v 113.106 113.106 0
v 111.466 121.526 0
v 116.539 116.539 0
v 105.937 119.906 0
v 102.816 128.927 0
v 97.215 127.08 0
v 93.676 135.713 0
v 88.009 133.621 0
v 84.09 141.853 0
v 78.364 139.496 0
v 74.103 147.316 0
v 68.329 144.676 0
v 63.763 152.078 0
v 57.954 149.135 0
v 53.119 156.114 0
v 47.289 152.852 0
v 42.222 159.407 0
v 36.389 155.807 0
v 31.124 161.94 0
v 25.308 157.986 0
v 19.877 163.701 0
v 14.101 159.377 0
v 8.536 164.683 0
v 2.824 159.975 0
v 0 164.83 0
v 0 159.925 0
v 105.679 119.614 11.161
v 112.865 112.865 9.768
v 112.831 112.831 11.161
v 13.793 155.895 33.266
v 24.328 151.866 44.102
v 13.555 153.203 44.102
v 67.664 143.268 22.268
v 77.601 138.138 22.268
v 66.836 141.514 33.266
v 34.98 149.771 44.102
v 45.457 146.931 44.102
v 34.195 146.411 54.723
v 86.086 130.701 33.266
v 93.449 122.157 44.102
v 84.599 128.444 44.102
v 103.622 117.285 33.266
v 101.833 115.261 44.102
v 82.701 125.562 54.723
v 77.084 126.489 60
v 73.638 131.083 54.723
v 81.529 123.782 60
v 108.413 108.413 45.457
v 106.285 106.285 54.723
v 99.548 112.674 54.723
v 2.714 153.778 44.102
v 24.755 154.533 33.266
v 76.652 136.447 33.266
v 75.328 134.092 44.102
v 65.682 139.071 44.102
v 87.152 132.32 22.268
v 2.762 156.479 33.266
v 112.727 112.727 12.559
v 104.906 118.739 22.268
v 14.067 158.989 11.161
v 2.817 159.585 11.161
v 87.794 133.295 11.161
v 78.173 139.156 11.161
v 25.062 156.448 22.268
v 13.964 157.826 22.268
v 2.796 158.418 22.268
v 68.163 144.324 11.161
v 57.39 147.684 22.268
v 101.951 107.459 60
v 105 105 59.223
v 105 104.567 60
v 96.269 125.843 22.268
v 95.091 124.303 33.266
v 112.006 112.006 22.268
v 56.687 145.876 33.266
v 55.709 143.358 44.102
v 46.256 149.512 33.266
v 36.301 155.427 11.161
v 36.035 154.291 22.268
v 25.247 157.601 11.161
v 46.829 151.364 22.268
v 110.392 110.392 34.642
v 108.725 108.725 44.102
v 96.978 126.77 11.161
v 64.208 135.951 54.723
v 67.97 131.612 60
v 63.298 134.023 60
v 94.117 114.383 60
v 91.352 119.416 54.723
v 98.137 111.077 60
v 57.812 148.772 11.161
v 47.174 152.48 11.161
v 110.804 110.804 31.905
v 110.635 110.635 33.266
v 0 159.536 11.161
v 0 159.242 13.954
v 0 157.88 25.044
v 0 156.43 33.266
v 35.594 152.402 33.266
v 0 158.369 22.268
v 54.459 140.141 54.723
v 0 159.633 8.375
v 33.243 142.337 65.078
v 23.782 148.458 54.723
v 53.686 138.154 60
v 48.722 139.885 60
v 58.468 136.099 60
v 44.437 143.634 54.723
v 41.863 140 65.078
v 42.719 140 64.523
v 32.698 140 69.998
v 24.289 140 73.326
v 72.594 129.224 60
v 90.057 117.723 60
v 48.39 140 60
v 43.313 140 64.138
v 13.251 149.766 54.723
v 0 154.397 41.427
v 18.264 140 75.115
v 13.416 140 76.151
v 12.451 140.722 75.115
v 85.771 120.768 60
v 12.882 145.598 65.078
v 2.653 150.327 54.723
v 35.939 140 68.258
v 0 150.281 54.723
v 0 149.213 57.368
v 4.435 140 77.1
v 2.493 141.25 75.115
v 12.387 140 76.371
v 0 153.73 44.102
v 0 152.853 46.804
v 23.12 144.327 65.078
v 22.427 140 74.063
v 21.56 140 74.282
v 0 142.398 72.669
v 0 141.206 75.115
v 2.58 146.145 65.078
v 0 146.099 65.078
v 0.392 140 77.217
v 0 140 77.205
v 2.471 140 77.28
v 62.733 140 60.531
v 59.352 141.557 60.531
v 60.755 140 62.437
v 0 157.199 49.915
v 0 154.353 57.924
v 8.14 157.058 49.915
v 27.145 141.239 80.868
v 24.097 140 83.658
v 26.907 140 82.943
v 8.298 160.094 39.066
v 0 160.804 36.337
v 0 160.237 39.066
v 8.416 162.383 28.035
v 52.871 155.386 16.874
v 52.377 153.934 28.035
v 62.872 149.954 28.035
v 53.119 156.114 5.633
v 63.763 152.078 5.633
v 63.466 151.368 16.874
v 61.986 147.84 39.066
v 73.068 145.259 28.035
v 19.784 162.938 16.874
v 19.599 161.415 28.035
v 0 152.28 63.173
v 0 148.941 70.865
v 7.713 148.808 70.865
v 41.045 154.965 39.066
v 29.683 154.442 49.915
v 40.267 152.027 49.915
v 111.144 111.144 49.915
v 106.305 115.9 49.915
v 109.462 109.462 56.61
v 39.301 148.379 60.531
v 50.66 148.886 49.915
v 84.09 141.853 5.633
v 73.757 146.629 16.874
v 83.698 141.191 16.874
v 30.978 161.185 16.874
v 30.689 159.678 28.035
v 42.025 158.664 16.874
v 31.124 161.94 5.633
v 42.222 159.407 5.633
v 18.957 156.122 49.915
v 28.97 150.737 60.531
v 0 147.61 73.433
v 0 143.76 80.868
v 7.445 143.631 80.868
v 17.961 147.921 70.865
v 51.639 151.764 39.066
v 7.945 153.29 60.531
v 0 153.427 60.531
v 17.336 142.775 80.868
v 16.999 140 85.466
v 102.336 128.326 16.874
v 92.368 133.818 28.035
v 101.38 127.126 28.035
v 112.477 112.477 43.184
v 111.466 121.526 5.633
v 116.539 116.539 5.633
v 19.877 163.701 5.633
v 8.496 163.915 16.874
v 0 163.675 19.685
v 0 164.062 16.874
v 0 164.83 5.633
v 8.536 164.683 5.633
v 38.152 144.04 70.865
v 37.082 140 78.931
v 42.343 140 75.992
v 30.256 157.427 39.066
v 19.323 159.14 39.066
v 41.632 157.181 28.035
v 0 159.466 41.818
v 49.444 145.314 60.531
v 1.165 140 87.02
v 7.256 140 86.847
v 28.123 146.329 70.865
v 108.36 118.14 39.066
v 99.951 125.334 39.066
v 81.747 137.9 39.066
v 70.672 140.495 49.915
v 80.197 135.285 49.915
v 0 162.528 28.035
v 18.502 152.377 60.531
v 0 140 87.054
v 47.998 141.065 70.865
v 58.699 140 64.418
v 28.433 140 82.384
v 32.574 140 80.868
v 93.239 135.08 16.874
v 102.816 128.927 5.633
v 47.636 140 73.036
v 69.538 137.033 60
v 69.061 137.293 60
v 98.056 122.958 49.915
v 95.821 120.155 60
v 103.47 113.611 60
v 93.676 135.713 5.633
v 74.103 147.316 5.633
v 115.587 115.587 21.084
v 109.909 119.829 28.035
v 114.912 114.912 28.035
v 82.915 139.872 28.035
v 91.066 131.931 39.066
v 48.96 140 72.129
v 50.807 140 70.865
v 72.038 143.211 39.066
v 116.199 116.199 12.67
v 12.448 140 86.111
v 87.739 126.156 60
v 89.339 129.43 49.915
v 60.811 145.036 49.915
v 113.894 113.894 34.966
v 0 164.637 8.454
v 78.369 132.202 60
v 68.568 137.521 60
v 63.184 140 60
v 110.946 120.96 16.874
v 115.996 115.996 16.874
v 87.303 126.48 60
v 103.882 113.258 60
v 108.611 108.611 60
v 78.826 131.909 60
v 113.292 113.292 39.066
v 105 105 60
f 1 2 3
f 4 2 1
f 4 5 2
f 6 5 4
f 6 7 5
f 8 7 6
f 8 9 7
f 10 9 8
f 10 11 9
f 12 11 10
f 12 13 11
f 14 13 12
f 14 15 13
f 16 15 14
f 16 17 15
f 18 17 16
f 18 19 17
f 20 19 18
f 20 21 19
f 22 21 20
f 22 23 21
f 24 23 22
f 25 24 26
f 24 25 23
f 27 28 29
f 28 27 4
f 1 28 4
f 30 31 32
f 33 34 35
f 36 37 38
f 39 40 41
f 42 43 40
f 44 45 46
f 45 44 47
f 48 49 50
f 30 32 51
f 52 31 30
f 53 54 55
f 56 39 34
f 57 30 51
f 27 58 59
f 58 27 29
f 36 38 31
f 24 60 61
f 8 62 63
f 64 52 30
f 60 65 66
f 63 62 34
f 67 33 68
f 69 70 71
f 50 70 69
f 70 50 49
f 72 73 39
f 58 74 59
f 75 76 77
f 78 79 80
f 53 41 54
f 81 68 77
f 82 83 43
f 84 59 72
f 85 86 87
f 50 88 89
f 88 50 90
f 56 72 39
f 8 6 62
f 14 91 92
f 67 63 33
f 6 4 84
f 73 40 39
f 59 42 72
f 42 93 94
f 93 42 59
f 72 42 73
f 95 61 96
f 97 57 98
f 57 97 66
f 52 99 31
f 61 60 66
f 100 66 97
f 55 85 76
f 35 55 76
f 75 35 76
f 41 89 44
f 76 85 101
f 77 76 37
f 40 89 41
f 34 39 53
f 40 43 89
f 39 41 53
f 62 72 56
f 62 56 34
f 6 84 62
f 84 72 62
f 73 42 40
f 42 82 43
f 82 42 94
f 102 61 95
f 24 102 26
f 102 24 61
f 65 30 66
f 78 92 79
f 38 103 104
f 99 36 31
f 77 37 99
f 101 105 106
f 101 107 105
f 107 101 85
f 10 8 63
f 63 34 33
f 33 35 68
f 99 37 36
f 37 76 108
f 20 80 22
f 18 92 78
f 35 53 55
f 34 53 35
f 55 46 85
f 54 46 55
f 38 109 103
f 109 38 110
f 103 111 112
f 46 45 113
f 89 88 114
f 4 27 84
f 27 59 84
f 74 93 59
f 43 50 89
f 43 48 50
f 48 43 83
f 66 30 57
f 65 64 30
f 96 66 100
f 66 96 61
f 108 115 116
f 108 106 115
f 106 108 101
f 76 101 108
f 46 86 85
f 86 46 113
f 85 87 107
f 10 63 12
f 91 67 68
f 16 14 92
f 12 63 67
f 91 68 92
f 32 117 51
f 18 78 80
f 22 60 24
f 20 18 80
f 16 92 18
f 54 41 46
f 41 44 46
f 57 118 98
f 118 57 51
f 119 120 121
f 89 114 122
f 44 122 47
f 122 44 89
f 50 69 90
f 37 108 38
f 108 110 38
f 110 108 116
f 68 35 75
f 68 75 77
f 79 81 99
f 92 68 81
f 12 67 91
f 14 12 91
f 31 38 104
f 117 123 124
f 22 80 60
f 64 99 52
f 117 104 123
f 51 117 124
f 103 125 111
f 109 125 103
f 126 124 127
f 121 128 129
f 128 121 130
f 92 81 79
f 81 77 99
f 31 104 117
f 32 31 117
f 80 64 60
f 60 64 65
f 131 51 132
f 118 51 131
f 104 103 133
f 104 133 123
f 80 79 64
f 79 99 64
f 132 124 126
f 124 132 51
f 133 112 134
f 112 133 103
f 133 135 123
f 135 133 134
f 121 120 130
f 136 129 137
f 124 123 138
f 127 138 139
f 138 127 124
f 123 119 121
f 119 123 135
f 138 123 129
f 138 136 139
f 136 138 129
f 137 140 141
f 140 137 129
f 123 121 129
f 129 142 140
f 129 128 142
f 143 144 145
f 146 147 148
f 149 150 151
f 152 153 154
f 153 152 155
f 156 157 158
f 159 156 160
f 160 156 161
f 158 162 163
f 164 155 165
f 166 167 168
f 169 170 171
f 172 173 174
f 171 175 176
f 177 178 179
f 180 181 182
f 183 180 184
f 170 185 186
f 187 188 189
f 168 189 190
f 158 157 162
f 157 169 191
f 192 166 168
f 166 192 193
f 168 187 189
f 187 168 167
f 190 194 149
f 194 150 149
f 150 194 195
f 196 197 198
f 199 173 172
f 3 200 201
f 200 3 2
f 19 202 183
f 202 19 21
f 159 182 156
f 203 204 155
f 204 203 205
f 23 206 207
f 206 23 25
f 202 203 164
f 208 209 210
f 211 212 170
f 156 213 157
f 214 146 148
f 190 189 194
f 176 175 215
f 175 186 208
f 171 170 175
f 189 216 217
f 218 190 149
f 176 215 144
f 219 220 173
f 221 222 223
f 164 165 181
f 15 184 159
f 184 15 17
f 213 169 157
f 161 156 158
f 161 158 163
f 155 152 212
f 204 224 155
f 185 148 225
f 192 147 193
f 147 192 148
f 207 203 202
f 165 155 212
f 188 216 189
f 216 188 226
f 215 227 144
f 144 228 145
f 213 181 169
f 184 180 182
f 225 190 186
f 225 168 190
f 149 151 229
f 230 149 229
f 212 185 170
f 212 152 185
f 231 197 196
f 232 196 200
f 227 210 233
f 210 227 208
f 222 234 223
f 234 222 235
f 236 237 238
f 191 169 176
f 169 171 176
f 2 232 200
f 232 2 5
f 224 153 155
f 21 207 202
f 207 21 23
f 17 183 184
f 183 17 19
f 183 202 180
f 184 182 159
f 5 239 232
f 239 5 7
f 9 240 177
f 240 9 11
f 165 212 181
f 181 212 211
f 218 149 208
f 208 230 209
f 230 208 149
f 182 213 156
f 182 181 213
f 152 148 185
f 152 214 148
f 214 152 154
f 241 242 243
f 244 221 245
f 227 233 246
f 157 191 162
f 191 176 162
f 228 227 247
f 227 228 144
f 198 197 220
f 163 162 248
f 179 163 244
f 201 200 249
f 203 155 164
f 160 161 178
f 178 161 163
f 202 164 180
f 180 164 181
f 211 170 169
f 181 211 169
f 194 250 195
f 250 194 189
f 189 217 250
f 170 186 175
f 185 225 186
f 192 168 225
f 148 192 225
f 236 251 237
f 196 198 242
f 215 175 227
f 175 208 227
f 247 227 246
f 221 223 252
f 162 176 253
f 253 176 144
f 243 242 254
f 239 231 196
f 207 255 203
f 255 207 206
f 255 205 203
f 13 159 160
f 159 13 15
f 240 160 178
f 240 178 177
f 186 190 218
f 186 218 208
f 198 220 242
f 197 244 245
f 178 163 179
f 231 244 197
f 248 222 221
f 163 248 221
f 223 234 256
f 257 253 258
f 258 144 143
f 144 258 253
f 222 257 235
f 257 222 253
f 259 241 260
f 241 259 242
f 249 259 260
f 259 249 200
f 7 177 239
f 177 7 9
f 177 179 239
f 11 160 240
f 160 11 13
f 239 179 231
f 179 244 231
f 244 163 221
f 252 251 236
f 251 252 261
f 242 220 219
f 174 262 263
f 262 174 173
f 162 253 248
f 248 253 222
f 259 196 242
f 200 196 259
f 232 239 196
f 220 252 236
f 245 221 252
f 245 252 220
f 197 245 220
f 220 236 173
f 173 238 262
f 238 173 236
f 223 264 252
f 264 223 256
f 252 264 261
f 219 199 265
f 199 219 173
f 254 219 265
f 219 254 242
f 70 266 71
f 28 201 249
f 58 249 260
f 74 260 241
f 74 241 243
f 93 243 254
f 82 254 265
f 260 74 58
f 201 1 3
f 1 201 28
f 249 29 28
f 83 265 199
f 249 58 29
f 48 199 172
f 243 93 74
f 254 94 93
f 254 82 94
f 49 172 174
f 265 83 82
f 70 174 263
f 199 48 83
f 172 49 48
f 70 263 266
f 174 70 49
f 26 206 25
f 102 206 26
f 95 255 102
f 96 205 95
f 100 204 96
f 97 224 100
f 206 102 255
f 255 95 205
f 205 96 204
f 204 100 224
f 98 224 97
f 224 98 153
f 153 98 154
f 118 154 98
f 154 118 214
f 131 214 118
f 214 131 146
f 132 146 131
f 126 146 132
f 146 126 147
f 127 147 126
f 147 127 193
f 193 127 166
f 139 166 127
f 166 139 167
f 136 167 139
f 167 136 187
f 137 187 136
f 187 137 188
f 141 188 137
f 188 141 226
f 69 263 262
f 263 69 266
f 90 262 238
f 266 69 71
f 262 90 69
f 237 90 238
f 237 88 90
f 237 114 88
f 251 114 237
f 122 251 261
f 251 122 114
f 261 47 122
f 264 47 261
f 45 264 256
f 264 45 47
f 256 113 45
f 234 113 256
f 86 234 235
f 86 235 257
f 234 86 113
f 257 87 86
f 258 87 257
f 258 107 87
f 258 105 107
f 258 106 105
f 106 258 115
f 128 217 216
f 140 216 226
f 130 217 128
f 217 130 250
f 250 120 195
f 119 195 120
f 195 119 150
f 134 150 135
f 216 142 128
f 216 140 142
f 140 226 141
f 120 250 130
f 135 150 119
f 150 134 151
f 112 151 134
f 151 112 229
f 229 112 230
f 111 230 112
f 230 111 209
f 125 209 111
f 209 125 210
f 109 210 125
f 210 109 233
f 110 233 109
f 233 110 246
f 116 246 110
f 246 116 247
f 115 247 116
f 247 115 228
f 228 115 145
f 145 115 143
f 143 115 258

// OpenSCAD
// file: ../motors/MN5212.scad
use <../utils.scad>

module MN5212(){

	render(){
		translate([0,0, 42.5 / 2 - 23 / 2 - 4.9 - 6])
			cylinder(
				h = 23,
				r = 59 / 2,
				$fa = fa(59 / 2),
				center = true);
		translate([0,0, 42.5 / 2 - 4.9 / 2 - 6])
			cylinder(
				h = 4.9,
				r1 = 59 / 2,
				r2 = 24.8 / 2,
				$fa = fa(59 / 2),
				center = true);
		translate([0,0, - 42.5 / 2 + 5.6 / 2 + 3])
			cylinder(
				h = 5.6,
				r1 = 44 / 2,
				r2 = 59 / 2,
				$fa = fa(59 / 2),
				center = true);
		translate([0, 0, 42.5 / 2 - 3])
			cylinder(
				h = 6,
				r = 4 / 2,
				$fa = fa(4 / 2),
				center = true);
		translate([0, 0, - 42.5 / 2 + 1.5])
			cylinder(
				h = 3,
				r = 6 / 2,
				$fa = fa(6 / 2),
				center = true);
	}

}
// file: ../servos/HS_5065MG.scad
use <../utils.scad>

module HS_5065MG(){

	length = 23.75;
	width = 11.68;
	depth = 20.32;
	wing_width = 32.38;
	wing_thick = 3.43;
	shaft_offset = 6;
	hole_spacing = 28.32;
	shaft_height = 26.16;
	shaft_length = 2;

	module mounting_hole(){
		mh_rad = 2 / 2;
		translate(
			[
				hole_spacing / 2,
				0,
				depth / 2 - wing_thick / 2
			])
			cylinder(h = 5, r = mh_rad, $fa = fa(mh_rad), center = true);
	}

	difference(){
		union(){
			cube([length, width, depth], center = true);
			translate([0, 0, depth / 2 - wing_thick / 2])
				cube([wing_width, width, wing_thick], center = true);
			translate(
				[
					- length / 2 + shaft_offset,
					0,
					shaft_height - length / 2 + shaft_length / 2
				])
				cylinder(
					h = shaft_length,
					r = 1.5,
					$fa = fa(1.5),
					center = true);
		}	union(){

			mounting_hole();
			mirror() mounting_hole();
		}
	}
}

HS_5065MG();
// file: ../servos/LS_0006_servo.scad
// Author Michael Marques (DrYerzinia)

use <../utils.scad>

module ls_0006_servo(){
	
	length = 21.4;
	depth = 19.9;
	thickness = 11.65;

	gear_height = 2.6;
	gear_bump_height = 0.7;
	gear_bump_diameter = 1.97;
	gear_outer_bump_diameter = 6;
	gear_bump_offset = 12.2;

	shaft_height = 2.4;
	shaft_diameter = 3.74;
	shaft_offset = thickness / 2;
	shaft_screw_diameter = 1.3;
	
	wing_outer_width = 8.5;
	wing_top_off = 3.8;
	wing_length = 3.8;
	wing_thickness = 1.2;
	wing_hole_diameter = 1.85;
	wing_hole_edge_dist = 2;

	module wing_hole(){
		translate(
			[
				length / 2 + wing_hole_edge_dist,
				0,
				depth/2 - wing_top_off - wing_thickness / 2
			])
			cylinder(
				h = wing_thickness + 1,
				r = wing_hole_diameter / 2,
				$fn = 16,
				center = true);
	}

	module wing(){
		translate(
			[
				length / 2,
				thickness / 2,
				depth/2 - wing_top_off - wing_thickness
			])
			rotate([0,0,-90])
				trapezoid(
					thickness,
					wing_outer_width,
					wing_length,
					wing_thickness);
	}

	// Body
	cube([length, thickness, depth], center = true);

	difference(){
		union(){

			wing();
			mirror() wing();

			// Gear Bumps
			translate([0, 0, depth/2 + gear_height / 2]){
				translate([length / 2 - gear_bump_offset, 0, 0])
					cylinder(
						h = gear_height,
						r = gear_outer_bump_diameter / 2,
						$fn = 16,
						center = true);
				translate([length / 2 - gear_bump_offset, 0, gear_height/2 + gear_bump_height / 2])
					cylinder(
						h = gear_bump_height,
						r = gear_bump_diameter / 2,
						$fn = 16,
						center = true);
				translate([length / 2 - shaft_offset, 0, 0])
					cylinder(
						h = gear_height,
						r = thickness / 2,
						$fn = 32,
						center = true);
				// Shaft
				translate([length / 2 - shaft_offset, 0, gear_height])
					cylinder(
						h = shaft_height,
						r = shaft_diameter / 2,
						$fn = 16,
						center = true);
			}

		}
		union(){

			wing_hole();
			mirror() wing_hole();

			// Shaft_hole
			translate(
				[
					length / 2 - shaft_offset,
					0,
					depth/2 + gear_height * (3 / 2) + 0.5])
				cylinder(
					h = shaft_height + 1,
					r = shaft_screw_diameter / 2,
					$fn = 16,
					center = true);

		}
	}

}

module translate_ls_0006_attachment(){

	length = 21.4;
	thickness = 11.65;
	shaft_offset = thickness / 2;
	depth = 19.9;
	float = 3.3;

	translate([length / 2 - shaft_offset, 0, depth / 2 + float])
		children();

}

module bar_attachment(){

	height = 3.75;
	bar_length = 14.7;
	bar_thickness = 1.6;
	inner_radius = 5.9;
	outer_radius = 3.95;
	shaft_diameter = 3.7;
	upper_void_diameter = 4.8;
	screw_diameter = 2;
	hole_spacing = 2;
	hole_4_diameter = 1.2;
	hole_diameter = 1;
	hole_start_off = 4.7;
	top_void_depth = 0.67;
	bottom_void_depth = 1.84;

	translate([0, 0, height / 2]){
		difference(){
			union(){

				translate([0, inner_radius / 2, height / 2 - bar_thickness])
					rotate([0,0,-90])
						trapezoid(
							inner_radius,
							outer_radius,
							bar_length,
							bar_thickness);

				cylinder(
					h = height,
					r = inner_radius / 2,
					$fn = 16,
					center = true);

				translate([bar_length, 0, height / 2 - bar_thickness / 2])
					cylinder(
						h = bar_thickness,
						r = outer_radius / 2,
						$fn = 16,
						center = true);

			}
			union(){
				// screwhole
				cylinder(
					h = height + 1,
					r = screw_diameter / 2,
					$fn = 16,
					center = true);
				// voids
				translate([0, 0, height / 2 - top_void_depth / 2 + 0.5])
					cylinder(
						h = top_void_depth + 1,
						r = upper_void_diameter / 2,
						$fn = 16,
						center = true);
				translate([0, 0,  - bottom_void_depth / 2 - 0.5])
					cylinder(
						h = bottom_void_depth + 1,
						r = shaft_diameter / 2,
						$fn = 16,
						center = true);

				for(i = [0:4]){
					dia = (i != 3) ? hole_diameter : hole_4_diameter;
					translate(
						[
							hole_start_off + hole_spacing * i,
							0,
							height / 2 - bar_thickness / 2])
						cylinder(
							h = bar_thickness + 1,
							r = dia / 2,
							$fn = 16,
							center = true);
				}

			}
		}
	}

}

ls_0006_servo();
translate_ls_0006_attachment() bar_attachment();
// file: ../servos/parallax_continuous_rotation_servo.scad
// Author Michael Marques (DrYerzinia)

module parallax_continuous_rotation_servo(){

	depth = 37.7;
	length = 40.75;
	width = 19.75;

	mount_height = 2.7;
	mount_extent = 6.1;
	mount_from_top = 7.7;

	mount_hole_diameter = 4.46;
	mount_hole_spacing = 14.4 - mount_hole_diameter;

	shaft_diameter = 5.8;
	shaft_offset = 10;
	shaft_length = 3.5;

	module mounting_hole(){

			translate(
				[
					length / 2 + 5,
					mount_hole_spacing / 2,
					depth / 2 - mount_height / 2 - mount_from_top
				]
				)
				cylinder(
					h = mount_height + 1,
					r = mount_hole_diameter / 2,
					$fn=16,
					center = true);
	}

	difference(){
		union(){

			// Body
			cube([length,width,depth], center = true);

			// Mounting wings
			translate(
				[
					0,
					0,
					depth / 2 - mount_height / 2 - mount_from_top
				])
				cube(
					[
						length + mount_extent * 2,
						width,
						mount_height
					],
					center = true);

			// Shaft
			translate(
				[
					length / 2 - shaft_offset,
					0,
					depth / 2 + shaft_length / 2
				]
				)
				cylinder(
					h = shaft_length,
					r = shaft_diameter / 2,
					$fn = 16,
					center = true
				);

		}
		union(){

			// Mounting Holes
			mounting_hole();
			mirror()
				mounting_hole();

			translate([0,-mount_hole_spacing,0]){
				mounting_hole();
				mirror()
					mounting_hole();
			}
		}
	}

}

module translate_shaft(){

	depth = 37.7;
	length = 40.75;

	shaft_offset = 10;

	translate(
		[
			length / 2 - shaft_offset,
			0,
			depth / 2
		])
		children();
}

module round_servo_attachment(){

	height = 6;
	diameter = 20.8;
	inner_diameter = 8.6;
	plate_thickness = 2.45;

	float = 2;

	depth = 37.7;
	length = 40.75;

	shaft_offset = 10;

	plate_hole_spacing = 14.5;
	plate_hole_diameter = 1.4;
	plate_hole_minor_spacing = 3.5;

	screw_hole_diameter = 3;

	inner_diameter = 8;
	
	top_depth = 1.8;
	bottom_depth = 3.4;

	void_diameter = 5.8;

	module plate_hole(){
		cylinder(
			h = plate_thickness + 1,
			r = plate_hole_diameter / 2,
			$fn = 16,
			center = true
		);
	}

	module plate_hole_group(){
		translate([0, 0, height / 2 - plate_thickness / 2]){
			translate([0, plate_hole_spacing / 2, 0]){
					plate_hole();
					translate([- plate_hole_minor_spacing, 0, 0])
						plate_hole();
					translate([  plate_hole_minor_spacing, 0, 0])
						plate_hole();
			}
		}
	}

	translate(
		[
			length / 2 - shaft_offset,
			0,
			depth / 2 + height / 2 + float
		]
		)
		difference(){

			union(){

				// inner shaft
				cylinder(
					h = height,
					r = inner_diameter / 2,
					$fn = 16,
					center = true
				);

				// top
				translate([0, 0, height / 2 - plate_thickness / 2])
					cylinder(
						h = plate_thickness,
						r = diameter / 2,
						$fn = 32,
						center = true
					);
			}

			union(){

				// plate holes
				for(ang = [0:3]){
					rotate([0,0, ang * 90])
						plate_hole_group();
				}

				// screw hole
				cylinder(
					h = height + 1,
					r = screw_hole_diameter / 2,
					$fn = 16,
					center = true
				);

				// inner voids
				translate([0, 0, height / 2 - top_depth / 2 + 1])
					cylinder(
						h = top_depth + 1,
						r = void_diameter / 2,
						$fn = 16,
						center = true
					);
				translate([0, 0, -1])
					cylinder(
						h = bottom_depth + 1,
						r = void_diameter / 2,
						$fn = 16,
						center = true
					);

			}

		}

}

parallax_continuous_rotation_servo();
round_servo_attachment();
// file: ../hardware.scad
 // Author Michael Marques (DrYerzinia)

// http://www.ebay.com/itm/10-PCS-683-3x7x2-mm-Metal-OPEN-PRECISION-Miniature-Ball-Bearing-3-7-2-/291206307942?hash=item43cd3fa066:m:mCi6eovrGVk_CjIUjlhw8yg
// E-Bay empire.rc

module washer_M3_7x3_2x0_5mm(){

	difference(){
		cylinder(
			h = 0.5,
			r = 7 / 2,
			$fn = 16,
			center = true);
		cylinder(
			h = 0.5 + 0.1,
			r = 3.2 / 2,
			$fn = 16,
			center = true);
	}

}

module bearing_3x7x2mm(){

	difference(){
		cylinder(
			h = 2,
			r = 7 / 2,
			$fn = 16,
			center = true);
		cylinder(
			h = 2 + 1,
			r = 3 / 2,
			$fn = 16,
			center = true);
	}

}

module bearing_5x8x2_5mm(){

	difference(){
		cylinder(
			h = 2.5,
			r = 8 / 2,
			$fn = 16,
			center = true);
		cylinder(
			h = 2.5 + 1,
			r = 5 / 2,
			$fn = 16,
			center = true);
	}

}

module bearing_8x16x5mm(){

	difference(){
		cylinder(
			h = 5,
			r = 16 / 2,
			$fn = 16,
			center = true);
		cylinder(
			h = 5 + 1,
			r = 8 / 2,
			$fn = 16,
			center = true);
	}

}


bearing_5x8x2_5mm();
// file: ../utils.scad
// http://forum.openscad.org/Creating-pie-pizza-slice-shape-need-a-dynamic-length-array-td3148.html

module pie_slice(r, start_angle, end_angle) {
    R = r * sqrt(2) + 1;
    a0 = (4 * start_angle + 0 * end_angle) / 4;
    a1 = (3 * start_angle + 1 * end_angle) / 4;
    a2 = (2 * start_angle + 2 * end_angle) / 4;
    a3 = (1 * start_angle + 3 * end_angle) / 4;
    a4 = (0 * start_angle + 4 * end_angle) / 4;
    if(end_angle > start_angle)
        intersection() {
        circle(r, $fa = fa(r));
        polygon([
            [0,0],
            [R * cos(a0), R * sin(a0)],
            [R * cos(a1), R * sin(a1)],
            [R * cos(a2), R * sin(a2)],
            [R * cos(a3), R * sin(a3)],
            [R * cos(a4), R * sin(a4)],
            [0,0]
       ]);
    }
}

// https://github.com/openscad/openscad/issues/29

module rotate_about(v,a) {
	translate(v) rotate(a) translate(-v) children(0);
}

module rotate_about_axis(v, ang, axis) {
	translate(v) rotate(ang, axis) translate(-v) children(0);
}

// https://github.com/robofun/openscad-utils/blob/master/trapezoid.scad

module trapezoid(width_base, width_top,height,thickness) {
	

  linear_extrude(height = thickness) polygon(points=[[0,0],[width_base,0],[width_base-(width_base-width_top)/2,height],[(width_base-width_top)/2,height]], paths=[[0,1,2,3]]); 
  
}

// http://forum.openscad.org/fe-Tolerance-based-arc-approximation-td14212.html

function fa(r)=($fn>0)?360/$fn:($fe>0)?($fe<r)?min(45,2*acos(1-$fe/r)):45:$fa; 
// file: ../render_settings.scad
// Author Michael Marques (DrYerzinia)

// Lulzbot Mini tolerances
// x/y 0.1mm
// z   0.05mm
//
// 0.1mm   preview tolerance
// 0.025mm export  tolerance

$fs = 0.01;
$fn = undef;
$fa = 360 / 5;

$fe = 0.025;	// export
// main file
// Author Michael Marques (DrYerzinia)

include <../render_settings.scad>

use <../BB8.scad>

Body_P3();
